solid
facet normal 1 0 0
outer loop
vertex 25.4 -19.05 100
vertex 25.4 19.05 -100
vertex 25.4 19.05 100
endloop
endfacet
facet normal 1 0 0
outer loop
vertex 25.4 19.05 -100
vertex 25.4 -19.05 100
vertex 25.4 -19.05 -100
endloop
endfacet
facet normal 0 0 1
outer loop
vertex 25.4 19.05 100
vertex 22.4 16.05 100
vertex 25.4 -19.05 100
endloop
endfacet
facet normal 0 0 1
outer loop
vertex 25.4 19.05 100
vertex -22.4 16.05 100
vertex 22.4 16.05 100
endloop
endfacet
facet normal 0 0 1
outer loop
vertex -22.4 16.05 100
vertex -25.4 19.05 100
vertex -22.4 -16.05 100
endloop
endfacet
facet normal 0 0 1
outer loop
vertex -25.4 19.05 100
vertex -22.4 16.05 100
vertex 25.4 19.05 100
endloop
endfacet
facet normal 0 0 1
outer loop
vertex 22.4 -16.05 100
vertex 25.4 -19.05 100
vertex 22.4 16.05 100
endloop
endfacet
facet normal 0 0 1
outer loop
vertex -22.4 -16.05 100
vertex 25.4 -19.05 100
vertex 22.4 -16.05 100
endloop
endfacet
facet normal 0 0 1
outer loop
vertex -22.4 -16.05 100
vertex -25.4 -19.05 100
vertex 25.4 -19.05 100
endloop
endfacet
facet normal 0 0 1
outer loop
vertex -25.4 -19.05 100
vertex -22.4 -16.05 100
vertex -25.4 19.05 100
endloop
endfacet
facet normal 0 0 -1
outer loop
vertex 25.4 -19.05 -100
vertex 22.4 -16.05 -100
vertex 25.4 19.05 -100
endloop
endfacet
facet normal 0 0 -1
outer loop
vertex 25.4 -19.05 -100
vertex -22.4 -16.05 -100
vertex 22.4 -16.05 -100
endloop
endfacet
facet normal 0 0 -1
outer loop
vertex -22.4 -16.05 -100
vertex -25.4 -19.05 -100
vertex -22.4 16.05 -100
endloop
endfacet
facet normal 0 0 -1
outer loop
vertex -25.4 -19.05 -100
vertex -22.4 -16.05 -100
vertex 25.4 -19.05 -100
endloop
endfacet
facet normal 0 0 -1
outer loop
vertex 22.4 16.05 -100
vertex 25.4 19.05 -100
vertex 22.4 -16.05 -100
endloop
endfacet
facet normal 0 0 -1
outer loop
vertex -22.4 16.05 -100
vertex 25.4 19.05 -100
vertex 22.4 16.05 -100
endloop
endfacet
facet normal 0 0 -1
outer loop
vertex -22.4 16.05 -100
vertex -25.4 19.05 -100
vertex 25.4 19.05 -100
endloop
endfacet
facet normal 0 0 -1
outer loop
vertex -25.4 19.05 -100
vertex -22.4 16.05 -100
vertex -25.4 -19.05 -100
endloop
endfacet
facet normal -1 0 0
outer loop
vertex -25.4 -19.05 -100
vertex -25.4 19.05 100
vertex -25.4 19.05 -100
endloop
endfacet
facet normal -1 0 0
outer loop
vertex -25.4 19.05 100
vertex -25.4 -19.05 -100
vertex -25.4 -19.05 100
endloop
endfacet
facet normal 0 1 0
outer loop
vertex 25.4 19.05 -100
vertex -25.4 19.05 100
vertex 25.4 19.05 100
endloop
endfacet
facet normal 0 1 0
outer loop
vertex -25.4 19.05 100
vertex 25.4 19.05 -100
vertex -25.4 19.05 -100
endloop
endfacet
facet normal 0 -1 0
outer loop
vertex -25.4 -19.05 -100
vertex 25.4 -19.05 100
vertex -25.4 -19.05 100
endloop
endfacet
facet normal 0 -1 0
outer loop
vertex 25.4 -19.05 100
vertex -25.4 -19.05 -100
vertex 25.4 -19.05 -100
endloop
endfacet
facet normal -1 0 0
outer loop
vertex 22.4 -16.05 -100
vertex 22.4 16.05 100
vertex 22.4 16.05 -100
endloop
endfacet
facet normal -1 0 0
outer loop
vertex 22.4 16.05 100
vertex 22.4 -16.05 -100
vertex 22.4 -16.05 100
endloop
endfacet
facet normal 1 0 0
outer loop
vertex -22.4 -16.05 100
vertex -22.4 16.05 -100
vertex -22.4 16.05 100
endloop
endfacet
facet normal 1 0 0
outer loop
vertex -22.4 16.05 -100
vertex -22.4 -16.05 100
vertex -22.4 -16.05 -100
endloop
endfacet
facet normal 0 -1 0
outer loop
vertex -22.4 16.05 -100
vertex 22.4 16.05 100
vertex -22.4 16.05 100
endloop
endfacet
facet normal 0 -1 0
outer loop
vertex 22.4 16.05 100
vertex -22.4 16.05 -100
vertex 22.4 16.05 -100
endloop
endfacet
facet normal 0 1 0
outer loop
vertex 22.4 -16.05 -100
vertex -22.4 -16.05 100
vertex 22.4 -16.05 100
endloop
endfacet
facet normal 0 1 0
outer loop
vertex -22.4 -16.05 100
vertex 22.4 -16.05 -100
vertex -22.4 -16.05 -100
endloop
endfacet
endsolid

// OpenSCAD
// Aluminium rectangular hollow section (RHS)
// 50.8mm x 38.1mm x 3.0mm wall thickness

outer_width    = 50.8;  // X
outer_height   = 38.1;  // Y
wall_thickness = 3.0;   // wall
length         = 200;   // Z (extrusion length)
center_model   = true;

eps = 0.02;

module rhs_box_section(ow, oh, t, L, centered=true) {
    iw = ow - 2*t;
    ih = oh - 2*t;

    assert(iw > 0 && ih > 0, "Wall thickness too large for given outer dimensions.");

    // Make the tube open-ended so top/bottom views show the hollow interior.
    // Inner void is slightly longer to guarantee a clean through-cut.
    color("Silver")
    difference() {
        cube([ow, oh, L], center=centered);
        cube([iw, ih, L + 2*eps], center=centered);
    }
}

rhs_box_section(outer_width, outer_height, wall_thickness, length, center_model);
